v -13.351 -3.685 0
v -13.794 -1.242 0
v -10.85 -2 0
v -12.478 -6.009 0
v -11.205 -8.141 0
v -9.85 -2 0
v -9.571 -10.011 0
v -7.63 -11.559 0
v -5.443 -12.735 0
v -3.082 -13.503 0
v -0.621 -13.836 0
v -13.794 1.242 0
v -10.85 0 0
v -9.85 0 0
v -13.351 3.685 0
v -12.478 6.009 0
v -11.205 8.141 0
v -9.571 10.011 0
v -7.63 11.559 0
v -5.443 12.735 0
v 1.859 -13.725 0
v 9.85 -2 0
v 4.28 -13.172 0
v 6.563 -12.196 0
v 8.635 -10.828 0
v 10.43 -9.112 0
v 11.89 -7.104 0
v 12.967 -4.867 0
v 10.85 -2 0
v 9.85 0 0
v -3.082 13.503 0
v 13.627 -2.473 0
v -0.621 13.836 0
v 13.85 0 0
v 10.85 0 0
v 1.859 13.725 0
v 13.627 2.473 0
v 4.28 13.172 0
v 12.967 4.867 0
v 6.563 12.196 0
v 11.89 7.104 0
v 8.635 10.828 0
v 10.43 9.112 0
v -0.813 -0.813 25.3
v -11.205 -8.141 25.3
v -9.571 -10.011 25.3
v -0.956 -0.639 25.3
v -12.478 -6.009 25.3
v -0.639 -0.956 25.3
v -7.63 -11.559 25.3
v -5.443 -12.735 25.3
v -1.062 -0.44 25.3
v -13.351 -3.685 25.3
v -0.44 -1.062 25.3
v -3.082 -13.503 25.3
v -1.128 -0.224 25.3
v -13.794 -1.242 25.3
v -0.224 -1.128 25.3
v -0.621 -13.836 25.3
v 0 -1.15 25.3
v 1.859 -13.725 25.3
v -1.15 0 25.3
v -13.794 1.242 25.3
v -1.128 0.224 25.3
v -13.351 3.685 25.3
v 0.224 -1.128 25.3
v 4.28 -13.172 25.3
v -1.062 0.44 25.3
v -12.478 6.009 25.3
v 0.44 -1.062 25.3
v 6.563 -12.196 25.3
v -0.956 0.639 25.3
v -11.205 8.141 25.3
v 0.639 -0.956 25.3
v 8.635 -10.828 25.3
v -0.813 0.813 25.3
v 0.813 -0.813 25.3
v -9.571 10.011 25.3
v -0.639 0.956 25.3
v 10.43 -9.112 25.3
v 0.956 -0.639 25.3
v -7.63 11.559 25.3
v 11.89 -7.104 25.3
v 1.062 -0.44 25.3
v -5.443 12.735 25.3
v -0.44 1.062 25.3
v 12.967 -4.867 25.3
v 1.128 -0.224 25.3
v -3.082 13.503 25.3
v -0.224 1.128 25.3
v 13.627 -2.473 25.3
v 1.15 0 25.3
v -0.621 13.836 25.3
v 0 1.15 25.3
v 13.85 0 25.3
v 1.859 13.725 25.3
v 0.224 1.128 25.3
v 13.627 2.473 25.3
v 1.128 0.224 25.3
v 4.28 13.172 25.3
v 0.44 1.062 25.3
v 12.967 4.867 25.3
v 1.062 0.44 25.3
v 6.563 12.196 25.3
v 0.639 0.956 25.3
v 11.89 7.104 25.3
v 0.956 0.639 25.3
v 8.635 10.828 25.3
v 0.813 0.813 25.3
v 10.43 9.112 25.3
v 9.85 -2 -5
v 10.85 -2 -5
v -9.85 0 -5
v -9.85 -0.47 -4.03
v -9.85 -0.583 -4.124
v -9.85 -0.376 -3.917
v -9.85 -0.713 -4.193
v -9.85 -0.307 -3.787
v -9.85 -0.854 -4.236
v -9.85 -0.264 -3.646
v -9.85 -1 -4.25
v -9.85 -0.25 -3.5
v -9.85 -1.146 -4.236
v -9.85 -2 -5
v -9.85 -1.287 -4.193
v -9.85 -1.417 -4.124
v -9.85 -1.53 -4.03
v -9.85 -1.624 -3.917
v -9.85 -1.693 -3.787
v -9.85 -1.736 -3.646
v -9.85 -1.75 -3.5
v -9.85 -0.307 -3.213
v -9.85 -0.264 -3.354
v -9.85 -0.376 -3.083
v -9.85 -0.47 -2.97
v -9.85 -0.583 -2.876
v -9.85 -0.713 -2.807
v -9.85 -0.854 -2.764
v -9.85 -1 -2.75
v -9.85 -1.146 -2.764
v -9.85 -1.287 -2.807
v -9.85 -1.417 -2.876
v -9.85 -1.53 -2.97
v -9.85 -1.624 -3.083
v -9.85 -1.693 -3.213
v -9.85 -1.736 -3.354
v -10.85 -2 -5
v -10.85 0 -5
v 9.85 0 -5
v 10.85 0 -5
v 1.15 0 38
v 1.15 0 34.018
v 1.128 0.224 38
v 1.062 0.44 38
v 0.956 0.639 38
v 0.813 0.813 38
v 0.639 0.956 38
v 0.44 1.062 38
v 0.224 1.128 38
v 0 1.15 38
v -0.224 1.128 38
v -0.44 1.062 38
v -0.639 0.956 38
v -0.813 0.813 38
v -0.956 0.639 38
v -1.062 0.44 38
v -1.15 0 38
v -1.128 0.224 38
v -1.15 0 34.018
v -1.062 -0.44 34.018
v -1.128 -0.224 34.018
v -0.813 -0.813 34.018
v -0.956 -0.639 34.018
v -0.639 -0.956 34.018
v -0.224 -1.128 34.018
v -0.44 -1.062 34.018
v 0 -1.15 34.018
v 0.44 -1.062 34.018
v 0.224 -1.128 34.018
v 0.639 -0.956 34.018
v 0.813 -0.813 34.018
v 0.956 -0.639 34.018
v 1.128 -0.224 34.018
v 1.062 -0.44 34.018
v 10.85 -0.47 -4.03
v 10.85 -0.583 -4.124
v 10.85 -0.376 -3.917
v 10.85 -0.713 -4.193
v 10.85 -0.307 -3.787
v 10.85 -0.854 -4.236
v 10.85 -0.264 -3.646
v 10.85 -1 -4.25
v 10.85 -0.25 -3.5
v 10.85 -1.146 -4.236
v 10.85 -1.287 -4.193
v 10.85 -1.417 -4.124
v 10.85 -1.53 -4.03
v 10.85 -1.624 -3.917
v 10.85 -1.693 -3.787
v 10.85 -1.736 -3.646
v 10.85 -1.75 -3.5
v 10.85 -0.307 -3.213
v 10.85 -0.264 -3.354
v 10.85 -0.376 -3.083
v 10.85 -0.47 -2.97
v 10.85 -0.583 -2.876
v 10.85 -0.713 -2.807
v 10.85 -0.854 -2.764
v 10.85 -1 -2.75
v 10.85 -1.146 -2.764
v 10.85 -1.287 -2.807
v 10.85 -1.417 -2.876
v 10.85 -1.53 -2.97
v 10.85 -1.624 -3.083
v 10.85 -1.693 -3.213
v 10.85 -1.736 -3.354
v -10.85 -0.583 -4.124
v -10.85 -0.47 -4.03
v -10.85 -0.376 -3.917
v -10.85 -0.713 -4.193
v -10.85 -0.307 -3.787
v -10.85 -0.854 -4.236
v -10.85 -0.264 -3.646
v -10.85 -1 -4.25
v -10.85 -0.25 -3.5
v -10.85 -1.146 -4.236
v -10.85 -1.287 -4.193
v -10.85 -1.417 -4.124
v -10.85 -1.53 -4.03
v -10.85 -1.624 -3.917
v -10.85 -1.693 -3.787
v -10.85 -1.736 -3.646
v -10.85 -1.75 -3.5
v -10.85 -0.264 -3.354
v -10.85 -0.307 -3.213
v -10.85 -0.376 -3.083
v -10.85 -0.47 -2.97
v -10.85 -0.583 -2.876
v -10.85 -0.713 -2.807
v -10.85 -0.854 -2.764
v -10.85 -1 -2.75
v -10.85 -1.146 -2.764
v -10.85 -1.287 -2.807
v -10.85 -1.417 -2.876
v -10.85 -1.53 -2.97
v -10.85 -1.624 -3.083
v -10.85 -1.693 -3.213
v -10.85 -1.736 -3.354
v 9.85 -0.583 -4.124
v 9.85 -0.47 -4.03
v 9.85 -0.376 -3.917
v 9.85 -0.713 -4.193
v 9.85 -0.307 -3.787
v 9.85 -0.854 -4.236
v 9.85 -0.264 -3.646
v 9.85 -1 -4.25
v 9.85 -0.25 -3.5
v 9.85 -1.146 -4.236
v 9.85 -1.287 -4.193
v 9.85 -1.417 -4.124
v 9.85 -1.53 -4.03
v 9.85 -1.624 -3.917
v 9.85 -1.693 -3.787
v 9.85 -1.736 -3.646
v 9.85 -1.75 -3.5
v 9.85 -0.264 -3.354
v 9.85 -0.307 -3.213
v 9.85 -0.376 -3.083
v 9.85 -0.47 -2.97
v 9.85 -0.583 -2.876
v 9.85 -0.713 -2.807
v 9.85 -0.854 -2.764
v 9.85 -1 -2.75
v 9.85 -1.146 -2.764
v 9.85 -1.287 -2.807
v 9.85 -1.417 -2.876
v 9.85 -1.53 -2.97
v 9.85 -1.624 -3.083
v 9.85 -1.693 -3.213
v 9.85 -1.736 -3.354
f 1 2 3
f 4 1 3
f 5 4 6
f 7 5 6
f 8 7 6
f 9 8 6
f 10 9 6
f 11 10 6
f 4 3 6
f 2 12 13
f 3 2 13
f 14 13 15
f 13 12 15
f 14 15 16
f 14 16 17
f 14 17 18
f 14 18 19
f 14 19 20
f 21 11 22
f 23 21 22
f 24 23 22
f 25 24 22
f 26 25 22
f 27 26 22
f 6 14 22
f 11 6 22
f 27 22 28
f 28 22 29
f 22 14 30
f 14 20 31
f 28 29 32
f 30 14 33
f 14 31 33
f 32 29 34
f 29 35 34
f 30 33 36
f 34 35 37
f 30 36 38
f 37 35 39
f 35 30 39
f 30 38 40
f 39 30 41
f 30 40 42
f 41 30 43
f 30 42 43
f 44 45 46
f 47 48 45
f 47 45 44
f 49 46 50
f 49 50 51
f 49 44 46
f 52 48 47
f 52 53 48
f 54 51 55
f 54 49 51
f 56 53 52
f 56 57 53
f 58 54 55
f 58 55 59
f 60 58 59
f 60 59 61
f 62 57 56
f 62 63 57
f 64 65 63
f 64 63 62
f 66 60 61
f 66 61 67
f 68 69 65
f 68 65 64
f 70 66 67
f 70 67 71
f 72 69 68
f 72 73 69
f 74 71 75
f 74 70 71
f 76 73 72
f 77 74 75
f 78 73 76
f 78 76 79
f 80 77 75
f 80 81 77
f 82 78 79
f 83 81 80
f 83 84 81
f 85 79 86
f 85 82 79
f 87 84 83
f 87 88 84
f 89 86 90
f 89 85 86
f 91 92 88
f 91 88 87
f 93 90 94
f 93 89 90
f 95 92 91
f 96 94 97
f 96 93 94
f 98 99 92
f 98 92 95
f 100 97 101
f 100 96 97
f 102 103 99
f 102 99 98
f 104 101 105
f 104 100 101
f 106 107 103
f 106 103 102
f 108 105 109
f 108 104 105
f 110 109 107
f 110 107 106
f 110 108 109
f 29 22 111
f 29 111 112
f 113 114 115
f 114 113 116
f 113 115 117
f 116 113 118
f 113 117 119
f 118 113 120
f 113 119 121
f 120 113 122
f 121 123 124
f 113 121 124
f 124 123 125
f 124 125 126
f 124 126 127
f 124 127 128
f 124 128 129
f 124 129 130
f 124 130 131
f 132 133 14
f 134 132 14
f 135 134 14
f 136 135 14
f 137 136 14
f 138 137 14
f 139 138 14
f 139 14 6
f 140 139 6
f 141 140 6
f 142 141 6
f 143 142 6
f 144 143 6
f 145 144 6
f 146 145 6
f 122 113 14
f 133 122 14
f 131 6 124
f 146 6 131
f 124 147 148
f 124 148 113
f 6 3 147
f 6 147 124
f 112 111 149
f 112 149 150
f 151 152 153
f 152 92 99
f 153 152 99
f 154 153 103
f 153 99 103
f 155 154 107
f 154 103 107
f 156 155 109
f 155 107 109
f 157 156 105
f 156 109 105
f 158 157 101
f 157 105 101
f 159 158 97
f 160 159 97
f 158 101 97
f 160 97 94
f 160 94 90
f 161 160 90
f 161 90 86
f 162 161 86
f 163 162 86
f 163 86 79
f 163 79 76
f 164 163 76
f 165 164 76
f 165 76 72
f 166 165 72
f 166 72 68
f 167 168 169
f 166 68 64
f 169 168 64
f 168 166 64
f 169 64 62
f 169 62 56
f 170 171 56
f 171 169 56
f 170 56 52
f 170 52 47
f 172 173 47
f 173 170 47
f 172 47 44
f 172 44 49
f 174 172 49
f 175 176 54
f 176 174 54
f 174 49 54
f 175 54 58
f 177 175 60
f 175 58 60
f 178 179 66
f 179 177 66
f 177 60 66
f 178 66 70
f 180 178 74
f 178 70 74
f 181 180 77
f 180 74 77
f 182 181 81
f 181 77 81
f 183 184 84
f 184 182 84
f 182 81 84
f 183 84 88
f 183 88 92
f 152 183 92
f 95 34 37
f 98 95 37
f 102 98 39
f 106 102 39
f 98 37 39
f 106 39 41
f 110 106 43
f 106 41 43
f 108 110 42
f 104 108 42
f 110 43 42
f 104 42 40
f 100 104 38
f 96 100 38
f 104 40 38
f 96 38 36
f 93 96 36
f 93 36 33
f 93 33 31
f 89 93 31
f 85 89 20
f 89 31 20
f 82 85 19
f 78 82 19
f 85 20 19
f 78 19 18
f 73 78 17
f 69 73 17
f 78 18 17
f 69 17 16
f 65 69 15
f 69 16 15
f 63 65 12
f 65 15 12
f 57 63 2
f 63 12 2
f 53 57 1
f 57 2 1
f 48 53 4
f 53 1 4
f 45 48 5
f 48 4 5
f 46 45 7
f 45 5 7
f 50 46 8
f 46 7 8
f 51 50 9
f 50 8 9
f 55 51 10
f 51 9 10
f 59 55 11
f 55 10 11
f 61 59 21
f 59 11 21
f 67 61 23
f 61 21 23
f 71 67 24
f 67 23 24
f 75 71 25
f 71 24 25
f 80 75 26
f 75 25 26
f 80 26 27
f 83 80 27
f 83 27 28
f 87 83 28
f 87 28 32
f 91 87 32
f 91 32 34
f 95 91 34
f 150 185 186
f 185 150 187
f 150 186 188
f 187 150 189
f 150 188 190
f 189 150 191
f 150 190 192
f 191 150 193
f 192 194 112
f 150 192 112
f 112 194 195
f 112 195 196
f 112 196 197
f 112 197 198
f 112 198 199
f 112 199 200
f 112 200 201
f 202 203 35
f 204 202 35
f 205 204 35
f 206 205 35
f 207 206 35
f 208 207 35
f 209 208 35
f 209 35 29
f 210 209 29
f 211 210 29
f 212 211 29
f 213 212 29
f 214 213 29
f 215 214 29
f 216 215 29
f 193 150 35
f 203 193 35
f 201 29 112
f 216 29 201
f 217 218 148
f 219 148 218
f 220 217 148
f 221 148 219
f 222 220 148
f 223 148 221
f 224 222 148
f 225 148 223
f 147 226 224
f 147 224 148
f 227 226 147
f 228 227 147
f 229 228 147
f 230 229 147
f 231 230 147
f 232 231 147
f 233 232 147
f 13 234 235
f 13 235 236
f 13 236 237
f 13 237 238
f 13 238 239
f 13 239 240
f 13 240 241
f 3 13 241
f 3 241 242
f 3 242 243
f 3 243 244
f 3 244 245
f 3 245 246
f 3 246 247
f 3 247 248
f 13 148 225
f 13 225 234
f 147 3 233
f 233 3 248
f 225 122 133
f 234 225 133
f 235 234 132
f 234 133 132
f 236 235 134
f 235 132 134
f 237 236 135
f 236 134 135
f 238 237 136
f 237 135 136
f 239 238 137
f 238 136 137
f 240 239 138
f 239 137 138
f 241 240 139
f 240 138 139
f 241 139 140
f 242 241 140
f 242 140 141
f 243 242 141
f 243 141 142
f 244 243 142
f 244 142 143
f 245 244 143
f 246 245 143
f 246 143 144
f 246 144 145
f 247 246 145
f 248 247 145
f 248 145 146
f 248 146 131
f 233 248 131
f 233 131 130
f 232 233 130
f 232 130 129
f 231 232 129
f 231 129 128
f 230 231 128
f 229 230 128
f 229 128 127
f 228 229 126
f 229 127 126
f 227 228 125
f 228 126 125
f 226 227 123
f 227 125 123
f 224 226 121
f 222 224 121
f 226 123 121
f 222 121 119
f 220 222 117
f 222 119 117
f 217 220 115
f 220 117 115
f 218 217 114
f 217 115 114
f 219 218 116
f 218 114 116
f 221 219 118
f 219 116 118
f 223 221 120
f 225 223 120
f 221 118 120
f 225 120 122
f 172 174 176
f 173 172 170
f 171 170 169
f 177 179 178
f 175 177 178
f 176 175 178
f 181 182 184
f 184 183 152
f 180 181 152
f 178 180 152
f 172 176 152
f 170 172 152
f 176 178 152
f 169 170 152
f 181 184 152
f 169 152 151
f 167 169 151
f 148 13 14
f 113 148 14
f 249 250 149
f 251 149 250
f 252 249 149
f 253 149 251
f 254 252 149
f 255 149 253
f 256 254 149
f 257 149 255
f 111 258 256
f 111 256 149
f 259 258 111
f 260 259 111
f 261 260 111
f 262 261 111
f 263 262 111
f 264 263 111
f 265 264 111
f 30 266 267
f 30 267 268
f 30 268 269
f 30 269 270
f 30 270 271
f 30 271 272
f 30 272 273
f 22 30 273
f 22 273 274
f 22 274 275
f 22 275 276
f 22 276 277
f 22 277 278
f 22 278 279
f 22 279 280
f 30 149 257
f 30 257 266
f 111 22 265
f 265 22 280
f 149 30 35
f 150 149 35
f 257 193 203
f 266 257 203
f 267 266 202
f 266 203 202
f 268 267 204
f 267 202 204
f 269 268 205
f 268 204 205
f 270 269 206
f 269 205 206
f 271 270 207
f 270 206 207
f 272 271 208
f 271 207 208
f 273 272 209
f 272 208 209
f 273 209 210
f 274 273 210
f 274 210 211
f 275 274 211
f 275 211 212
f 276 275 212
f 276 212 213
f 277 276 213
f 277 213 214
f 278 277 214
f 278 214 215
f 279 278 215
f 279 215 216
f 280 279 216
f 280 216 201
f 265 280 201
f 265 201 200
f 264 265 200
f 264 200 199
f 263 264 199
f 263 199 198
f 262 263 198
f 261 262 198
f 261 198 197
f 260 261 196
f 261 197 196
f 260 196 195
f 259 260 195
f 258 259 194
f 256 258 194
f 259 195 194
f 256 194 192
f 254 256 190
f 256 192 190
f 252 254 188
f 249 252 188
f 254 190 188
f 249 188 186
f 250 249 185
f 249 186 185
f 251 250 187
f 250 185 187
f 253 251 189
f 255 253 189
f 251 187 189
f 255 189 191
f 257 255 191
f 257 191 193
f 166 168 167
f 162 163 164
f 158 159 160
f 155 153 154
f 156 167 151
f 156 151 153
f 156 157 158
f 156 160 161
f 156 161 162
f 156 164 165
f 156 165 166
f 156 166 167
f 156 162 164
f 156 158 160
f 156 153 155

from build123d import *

# Parameters (mm, degrees)
F0_R      = 13.85
F1_DEPTH  = 25.3
F2_R      = 1.15
F3_DEPTH  = 12.7
F6_DEPTH  = 25
F7_W      = 1
F7_H      = 2
F8_DEPTH  = 5
F9_R      = 0.75
F10_DEPTH = 24.701


with BuildPart() as f1:
    # F0 (on Top) → F1 (new body)
    with BuildSketch(Plane.XY):
        Circle(F0_R)
    extrude(amount=F1_DEPTH)

    # F2 (on face) → F3 (join)
    with BuildSketch(Plane.XY.offset(25.3)):
        Circle(F2_R)
    extrude(amount=F3_DEPTH)

    # F5 (on offset) → F6 (cut)
    with BuildSketch(Plane.YZ.offset(1.15)):
        Polygon((0, 38.01338), (-1.15913, 38.01338), (-1.216348, 34.017637), (0, 34.017637), align=None)
    extrude(amount=-F6_DEPTH, mode=Mode.SUBTRACT)

    # F7 (on face) → F8 (join)
    with BuildSketch(Plane(origin=(0, 0, 0), x_dir=(1, 0, 0), z_dir=(0, 0, -1))):
        with Locations((-10.35, 1)):
            Rectangle(F7_W, F7_H)
        with Locations((10.35, 1)):
            Rectangle(F7_W, F7_H)
    extrude(amount=F8_DEPTH)

    # F9 (on face) → F10 (cut, through all)
    with BuildSketch(Plane.YZ.offset(10.85)):
        with Locations((-1, -3.5)):
            Circle(F9_R)
    extrude(amount=-F10_DEPTH, mode=Mode.SUBTRACT)


solid = f1.part
